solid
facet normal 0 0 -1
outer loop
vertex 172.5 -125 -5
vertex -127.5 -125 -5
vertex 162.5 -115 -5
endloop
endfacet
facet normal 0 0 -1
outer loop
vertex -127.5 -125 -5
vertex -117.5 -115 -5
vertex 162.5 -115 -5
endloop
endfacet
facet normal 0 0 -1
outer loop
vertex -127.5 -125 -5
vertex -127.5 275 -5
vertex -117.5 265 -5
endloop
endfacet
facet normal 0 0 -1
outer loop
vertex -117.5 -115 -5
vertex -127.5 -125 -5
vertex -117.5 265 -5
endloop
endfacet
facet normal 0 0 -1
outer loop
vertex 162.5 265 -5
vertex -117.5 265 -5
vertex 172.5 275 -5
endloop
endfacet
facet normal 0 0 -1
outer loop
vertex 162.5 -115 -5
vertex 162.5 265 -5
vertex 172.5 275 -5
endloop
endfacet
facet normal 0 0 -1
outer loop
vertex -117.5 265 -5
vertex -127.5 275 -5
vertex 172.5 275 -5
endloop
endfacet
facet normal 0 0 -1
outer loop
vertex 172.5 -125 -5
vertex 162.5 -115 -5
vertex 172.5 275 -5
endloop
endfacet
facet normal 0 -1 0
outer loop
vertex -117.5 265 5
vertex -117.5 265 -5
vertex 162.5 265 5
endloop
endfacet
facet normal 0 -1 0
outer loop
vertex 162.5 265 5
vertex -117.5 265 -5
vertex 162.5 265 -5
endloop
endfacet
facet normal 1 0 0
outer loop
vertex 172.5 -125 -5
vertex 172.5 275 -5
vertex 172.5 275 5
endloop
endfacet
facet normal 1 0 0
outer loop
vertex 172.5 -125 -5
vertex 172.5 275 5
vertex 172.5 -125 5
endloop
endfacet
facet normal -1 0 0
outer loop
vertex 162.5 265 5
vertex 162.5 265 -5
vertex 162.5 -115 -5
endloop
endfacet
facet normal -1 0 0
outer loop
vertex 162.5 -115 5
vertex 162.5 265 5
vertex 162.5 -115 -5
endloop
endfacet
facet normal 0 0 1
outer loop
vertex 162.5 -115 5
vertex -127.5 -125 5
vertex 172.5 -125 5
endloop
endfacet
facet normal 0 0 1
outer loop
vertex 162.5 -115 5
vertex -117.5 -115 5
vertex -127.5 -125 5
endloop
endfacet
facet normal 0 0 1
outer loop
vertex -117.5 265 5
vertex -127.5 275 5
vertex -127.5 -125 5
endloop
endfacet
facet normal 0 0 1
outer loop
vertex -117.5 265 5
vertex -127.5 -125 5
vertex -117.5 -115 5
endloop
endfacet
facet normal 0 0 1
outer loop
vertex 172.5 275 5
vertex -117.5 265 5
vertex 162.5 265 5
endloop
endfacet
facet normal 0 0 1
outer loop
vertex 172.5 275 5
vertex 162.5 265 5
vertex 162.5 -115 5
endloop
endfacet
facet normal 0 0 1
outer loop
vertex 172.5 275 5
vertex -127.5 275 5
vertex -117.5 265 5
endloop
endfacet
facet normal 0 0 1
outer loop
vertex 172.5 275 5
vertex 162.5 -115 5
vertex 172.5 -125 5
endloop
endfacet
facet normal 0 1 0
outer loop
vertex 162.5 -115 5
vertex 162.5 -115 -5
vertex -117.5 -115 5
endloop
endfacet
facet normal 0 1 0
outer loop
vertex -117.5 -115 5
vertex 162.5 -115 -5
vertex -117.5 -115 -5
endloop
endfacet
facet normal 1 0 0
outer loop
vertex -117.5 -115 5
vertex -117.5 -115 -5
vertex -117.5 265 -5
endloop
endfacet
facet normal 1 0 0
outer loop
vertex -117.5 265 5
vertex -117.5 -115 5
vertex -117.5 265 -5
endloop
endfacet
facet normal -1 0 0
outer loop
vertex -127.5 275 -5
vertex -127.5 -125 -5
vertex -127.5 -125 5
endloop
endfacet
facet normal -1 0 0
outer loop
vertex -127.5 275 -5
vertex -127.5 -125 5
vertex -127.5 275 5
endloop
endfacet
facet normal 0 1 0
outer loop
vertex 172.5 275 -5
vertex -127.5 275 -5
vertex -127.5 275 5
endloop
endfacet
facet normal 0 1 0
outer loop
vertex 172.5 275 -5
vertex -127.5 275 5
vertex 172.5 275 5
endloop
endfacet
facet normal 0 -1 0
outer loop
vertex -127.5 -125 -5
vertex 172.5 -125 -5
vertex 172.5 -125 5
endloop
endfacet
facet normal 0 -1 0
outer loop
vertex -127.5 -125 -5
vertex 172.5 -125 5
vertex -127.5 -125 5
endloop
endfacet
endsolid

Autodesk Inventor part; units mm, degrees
ref_plane "YZ Plane" through (0, 0, 0) normal (1, 0, 0) x (0, 1, 0)
ref_plane "XZ Plane" through (0, 0, 0) normal (0, 1, 0) x (-1, 0, 0)
ref_plane "XY Plane" through (0, 0, 0) normal (0, 0, 1) x (1, 0, 0)
sketch "Sketch1" plane through (0, 0, 0) normal (0, 0, 1) x (1, 0, 0)
  line L0 (-127.5, 275) -> (172.5, 275)
  line L1 (172.5, 275) -> (172.5, -125)
  line L2 (172.5, -125) -> (-127.5, -125)
  line L3 (-127.5, -125) -> (-127.5, 275)
  line L4 (-117.5, 265) -> (162.5, 265)
  line L5 (162.5, 265) -> (162.5, -115)
  line L6 (162.5, -115) -> (-117.5, -115)
  line L7 (-117.5, -115) -> (-117.5, 265)
  point P0 (0, 0)
  dimension "d0" = 300
  dimension "d1" = 10
  dimension "d2" = 10
  dimension "d3" = 10
  dimension "d4" = 10
  dimension "d5" = 400
  dimension "d6" = 172.5
  dimension "d7" = 115
extrude "Extrusion1" add sketch "Sketch1" along normal mid plane 10
properties part number "Steel support4" material "Steel"
